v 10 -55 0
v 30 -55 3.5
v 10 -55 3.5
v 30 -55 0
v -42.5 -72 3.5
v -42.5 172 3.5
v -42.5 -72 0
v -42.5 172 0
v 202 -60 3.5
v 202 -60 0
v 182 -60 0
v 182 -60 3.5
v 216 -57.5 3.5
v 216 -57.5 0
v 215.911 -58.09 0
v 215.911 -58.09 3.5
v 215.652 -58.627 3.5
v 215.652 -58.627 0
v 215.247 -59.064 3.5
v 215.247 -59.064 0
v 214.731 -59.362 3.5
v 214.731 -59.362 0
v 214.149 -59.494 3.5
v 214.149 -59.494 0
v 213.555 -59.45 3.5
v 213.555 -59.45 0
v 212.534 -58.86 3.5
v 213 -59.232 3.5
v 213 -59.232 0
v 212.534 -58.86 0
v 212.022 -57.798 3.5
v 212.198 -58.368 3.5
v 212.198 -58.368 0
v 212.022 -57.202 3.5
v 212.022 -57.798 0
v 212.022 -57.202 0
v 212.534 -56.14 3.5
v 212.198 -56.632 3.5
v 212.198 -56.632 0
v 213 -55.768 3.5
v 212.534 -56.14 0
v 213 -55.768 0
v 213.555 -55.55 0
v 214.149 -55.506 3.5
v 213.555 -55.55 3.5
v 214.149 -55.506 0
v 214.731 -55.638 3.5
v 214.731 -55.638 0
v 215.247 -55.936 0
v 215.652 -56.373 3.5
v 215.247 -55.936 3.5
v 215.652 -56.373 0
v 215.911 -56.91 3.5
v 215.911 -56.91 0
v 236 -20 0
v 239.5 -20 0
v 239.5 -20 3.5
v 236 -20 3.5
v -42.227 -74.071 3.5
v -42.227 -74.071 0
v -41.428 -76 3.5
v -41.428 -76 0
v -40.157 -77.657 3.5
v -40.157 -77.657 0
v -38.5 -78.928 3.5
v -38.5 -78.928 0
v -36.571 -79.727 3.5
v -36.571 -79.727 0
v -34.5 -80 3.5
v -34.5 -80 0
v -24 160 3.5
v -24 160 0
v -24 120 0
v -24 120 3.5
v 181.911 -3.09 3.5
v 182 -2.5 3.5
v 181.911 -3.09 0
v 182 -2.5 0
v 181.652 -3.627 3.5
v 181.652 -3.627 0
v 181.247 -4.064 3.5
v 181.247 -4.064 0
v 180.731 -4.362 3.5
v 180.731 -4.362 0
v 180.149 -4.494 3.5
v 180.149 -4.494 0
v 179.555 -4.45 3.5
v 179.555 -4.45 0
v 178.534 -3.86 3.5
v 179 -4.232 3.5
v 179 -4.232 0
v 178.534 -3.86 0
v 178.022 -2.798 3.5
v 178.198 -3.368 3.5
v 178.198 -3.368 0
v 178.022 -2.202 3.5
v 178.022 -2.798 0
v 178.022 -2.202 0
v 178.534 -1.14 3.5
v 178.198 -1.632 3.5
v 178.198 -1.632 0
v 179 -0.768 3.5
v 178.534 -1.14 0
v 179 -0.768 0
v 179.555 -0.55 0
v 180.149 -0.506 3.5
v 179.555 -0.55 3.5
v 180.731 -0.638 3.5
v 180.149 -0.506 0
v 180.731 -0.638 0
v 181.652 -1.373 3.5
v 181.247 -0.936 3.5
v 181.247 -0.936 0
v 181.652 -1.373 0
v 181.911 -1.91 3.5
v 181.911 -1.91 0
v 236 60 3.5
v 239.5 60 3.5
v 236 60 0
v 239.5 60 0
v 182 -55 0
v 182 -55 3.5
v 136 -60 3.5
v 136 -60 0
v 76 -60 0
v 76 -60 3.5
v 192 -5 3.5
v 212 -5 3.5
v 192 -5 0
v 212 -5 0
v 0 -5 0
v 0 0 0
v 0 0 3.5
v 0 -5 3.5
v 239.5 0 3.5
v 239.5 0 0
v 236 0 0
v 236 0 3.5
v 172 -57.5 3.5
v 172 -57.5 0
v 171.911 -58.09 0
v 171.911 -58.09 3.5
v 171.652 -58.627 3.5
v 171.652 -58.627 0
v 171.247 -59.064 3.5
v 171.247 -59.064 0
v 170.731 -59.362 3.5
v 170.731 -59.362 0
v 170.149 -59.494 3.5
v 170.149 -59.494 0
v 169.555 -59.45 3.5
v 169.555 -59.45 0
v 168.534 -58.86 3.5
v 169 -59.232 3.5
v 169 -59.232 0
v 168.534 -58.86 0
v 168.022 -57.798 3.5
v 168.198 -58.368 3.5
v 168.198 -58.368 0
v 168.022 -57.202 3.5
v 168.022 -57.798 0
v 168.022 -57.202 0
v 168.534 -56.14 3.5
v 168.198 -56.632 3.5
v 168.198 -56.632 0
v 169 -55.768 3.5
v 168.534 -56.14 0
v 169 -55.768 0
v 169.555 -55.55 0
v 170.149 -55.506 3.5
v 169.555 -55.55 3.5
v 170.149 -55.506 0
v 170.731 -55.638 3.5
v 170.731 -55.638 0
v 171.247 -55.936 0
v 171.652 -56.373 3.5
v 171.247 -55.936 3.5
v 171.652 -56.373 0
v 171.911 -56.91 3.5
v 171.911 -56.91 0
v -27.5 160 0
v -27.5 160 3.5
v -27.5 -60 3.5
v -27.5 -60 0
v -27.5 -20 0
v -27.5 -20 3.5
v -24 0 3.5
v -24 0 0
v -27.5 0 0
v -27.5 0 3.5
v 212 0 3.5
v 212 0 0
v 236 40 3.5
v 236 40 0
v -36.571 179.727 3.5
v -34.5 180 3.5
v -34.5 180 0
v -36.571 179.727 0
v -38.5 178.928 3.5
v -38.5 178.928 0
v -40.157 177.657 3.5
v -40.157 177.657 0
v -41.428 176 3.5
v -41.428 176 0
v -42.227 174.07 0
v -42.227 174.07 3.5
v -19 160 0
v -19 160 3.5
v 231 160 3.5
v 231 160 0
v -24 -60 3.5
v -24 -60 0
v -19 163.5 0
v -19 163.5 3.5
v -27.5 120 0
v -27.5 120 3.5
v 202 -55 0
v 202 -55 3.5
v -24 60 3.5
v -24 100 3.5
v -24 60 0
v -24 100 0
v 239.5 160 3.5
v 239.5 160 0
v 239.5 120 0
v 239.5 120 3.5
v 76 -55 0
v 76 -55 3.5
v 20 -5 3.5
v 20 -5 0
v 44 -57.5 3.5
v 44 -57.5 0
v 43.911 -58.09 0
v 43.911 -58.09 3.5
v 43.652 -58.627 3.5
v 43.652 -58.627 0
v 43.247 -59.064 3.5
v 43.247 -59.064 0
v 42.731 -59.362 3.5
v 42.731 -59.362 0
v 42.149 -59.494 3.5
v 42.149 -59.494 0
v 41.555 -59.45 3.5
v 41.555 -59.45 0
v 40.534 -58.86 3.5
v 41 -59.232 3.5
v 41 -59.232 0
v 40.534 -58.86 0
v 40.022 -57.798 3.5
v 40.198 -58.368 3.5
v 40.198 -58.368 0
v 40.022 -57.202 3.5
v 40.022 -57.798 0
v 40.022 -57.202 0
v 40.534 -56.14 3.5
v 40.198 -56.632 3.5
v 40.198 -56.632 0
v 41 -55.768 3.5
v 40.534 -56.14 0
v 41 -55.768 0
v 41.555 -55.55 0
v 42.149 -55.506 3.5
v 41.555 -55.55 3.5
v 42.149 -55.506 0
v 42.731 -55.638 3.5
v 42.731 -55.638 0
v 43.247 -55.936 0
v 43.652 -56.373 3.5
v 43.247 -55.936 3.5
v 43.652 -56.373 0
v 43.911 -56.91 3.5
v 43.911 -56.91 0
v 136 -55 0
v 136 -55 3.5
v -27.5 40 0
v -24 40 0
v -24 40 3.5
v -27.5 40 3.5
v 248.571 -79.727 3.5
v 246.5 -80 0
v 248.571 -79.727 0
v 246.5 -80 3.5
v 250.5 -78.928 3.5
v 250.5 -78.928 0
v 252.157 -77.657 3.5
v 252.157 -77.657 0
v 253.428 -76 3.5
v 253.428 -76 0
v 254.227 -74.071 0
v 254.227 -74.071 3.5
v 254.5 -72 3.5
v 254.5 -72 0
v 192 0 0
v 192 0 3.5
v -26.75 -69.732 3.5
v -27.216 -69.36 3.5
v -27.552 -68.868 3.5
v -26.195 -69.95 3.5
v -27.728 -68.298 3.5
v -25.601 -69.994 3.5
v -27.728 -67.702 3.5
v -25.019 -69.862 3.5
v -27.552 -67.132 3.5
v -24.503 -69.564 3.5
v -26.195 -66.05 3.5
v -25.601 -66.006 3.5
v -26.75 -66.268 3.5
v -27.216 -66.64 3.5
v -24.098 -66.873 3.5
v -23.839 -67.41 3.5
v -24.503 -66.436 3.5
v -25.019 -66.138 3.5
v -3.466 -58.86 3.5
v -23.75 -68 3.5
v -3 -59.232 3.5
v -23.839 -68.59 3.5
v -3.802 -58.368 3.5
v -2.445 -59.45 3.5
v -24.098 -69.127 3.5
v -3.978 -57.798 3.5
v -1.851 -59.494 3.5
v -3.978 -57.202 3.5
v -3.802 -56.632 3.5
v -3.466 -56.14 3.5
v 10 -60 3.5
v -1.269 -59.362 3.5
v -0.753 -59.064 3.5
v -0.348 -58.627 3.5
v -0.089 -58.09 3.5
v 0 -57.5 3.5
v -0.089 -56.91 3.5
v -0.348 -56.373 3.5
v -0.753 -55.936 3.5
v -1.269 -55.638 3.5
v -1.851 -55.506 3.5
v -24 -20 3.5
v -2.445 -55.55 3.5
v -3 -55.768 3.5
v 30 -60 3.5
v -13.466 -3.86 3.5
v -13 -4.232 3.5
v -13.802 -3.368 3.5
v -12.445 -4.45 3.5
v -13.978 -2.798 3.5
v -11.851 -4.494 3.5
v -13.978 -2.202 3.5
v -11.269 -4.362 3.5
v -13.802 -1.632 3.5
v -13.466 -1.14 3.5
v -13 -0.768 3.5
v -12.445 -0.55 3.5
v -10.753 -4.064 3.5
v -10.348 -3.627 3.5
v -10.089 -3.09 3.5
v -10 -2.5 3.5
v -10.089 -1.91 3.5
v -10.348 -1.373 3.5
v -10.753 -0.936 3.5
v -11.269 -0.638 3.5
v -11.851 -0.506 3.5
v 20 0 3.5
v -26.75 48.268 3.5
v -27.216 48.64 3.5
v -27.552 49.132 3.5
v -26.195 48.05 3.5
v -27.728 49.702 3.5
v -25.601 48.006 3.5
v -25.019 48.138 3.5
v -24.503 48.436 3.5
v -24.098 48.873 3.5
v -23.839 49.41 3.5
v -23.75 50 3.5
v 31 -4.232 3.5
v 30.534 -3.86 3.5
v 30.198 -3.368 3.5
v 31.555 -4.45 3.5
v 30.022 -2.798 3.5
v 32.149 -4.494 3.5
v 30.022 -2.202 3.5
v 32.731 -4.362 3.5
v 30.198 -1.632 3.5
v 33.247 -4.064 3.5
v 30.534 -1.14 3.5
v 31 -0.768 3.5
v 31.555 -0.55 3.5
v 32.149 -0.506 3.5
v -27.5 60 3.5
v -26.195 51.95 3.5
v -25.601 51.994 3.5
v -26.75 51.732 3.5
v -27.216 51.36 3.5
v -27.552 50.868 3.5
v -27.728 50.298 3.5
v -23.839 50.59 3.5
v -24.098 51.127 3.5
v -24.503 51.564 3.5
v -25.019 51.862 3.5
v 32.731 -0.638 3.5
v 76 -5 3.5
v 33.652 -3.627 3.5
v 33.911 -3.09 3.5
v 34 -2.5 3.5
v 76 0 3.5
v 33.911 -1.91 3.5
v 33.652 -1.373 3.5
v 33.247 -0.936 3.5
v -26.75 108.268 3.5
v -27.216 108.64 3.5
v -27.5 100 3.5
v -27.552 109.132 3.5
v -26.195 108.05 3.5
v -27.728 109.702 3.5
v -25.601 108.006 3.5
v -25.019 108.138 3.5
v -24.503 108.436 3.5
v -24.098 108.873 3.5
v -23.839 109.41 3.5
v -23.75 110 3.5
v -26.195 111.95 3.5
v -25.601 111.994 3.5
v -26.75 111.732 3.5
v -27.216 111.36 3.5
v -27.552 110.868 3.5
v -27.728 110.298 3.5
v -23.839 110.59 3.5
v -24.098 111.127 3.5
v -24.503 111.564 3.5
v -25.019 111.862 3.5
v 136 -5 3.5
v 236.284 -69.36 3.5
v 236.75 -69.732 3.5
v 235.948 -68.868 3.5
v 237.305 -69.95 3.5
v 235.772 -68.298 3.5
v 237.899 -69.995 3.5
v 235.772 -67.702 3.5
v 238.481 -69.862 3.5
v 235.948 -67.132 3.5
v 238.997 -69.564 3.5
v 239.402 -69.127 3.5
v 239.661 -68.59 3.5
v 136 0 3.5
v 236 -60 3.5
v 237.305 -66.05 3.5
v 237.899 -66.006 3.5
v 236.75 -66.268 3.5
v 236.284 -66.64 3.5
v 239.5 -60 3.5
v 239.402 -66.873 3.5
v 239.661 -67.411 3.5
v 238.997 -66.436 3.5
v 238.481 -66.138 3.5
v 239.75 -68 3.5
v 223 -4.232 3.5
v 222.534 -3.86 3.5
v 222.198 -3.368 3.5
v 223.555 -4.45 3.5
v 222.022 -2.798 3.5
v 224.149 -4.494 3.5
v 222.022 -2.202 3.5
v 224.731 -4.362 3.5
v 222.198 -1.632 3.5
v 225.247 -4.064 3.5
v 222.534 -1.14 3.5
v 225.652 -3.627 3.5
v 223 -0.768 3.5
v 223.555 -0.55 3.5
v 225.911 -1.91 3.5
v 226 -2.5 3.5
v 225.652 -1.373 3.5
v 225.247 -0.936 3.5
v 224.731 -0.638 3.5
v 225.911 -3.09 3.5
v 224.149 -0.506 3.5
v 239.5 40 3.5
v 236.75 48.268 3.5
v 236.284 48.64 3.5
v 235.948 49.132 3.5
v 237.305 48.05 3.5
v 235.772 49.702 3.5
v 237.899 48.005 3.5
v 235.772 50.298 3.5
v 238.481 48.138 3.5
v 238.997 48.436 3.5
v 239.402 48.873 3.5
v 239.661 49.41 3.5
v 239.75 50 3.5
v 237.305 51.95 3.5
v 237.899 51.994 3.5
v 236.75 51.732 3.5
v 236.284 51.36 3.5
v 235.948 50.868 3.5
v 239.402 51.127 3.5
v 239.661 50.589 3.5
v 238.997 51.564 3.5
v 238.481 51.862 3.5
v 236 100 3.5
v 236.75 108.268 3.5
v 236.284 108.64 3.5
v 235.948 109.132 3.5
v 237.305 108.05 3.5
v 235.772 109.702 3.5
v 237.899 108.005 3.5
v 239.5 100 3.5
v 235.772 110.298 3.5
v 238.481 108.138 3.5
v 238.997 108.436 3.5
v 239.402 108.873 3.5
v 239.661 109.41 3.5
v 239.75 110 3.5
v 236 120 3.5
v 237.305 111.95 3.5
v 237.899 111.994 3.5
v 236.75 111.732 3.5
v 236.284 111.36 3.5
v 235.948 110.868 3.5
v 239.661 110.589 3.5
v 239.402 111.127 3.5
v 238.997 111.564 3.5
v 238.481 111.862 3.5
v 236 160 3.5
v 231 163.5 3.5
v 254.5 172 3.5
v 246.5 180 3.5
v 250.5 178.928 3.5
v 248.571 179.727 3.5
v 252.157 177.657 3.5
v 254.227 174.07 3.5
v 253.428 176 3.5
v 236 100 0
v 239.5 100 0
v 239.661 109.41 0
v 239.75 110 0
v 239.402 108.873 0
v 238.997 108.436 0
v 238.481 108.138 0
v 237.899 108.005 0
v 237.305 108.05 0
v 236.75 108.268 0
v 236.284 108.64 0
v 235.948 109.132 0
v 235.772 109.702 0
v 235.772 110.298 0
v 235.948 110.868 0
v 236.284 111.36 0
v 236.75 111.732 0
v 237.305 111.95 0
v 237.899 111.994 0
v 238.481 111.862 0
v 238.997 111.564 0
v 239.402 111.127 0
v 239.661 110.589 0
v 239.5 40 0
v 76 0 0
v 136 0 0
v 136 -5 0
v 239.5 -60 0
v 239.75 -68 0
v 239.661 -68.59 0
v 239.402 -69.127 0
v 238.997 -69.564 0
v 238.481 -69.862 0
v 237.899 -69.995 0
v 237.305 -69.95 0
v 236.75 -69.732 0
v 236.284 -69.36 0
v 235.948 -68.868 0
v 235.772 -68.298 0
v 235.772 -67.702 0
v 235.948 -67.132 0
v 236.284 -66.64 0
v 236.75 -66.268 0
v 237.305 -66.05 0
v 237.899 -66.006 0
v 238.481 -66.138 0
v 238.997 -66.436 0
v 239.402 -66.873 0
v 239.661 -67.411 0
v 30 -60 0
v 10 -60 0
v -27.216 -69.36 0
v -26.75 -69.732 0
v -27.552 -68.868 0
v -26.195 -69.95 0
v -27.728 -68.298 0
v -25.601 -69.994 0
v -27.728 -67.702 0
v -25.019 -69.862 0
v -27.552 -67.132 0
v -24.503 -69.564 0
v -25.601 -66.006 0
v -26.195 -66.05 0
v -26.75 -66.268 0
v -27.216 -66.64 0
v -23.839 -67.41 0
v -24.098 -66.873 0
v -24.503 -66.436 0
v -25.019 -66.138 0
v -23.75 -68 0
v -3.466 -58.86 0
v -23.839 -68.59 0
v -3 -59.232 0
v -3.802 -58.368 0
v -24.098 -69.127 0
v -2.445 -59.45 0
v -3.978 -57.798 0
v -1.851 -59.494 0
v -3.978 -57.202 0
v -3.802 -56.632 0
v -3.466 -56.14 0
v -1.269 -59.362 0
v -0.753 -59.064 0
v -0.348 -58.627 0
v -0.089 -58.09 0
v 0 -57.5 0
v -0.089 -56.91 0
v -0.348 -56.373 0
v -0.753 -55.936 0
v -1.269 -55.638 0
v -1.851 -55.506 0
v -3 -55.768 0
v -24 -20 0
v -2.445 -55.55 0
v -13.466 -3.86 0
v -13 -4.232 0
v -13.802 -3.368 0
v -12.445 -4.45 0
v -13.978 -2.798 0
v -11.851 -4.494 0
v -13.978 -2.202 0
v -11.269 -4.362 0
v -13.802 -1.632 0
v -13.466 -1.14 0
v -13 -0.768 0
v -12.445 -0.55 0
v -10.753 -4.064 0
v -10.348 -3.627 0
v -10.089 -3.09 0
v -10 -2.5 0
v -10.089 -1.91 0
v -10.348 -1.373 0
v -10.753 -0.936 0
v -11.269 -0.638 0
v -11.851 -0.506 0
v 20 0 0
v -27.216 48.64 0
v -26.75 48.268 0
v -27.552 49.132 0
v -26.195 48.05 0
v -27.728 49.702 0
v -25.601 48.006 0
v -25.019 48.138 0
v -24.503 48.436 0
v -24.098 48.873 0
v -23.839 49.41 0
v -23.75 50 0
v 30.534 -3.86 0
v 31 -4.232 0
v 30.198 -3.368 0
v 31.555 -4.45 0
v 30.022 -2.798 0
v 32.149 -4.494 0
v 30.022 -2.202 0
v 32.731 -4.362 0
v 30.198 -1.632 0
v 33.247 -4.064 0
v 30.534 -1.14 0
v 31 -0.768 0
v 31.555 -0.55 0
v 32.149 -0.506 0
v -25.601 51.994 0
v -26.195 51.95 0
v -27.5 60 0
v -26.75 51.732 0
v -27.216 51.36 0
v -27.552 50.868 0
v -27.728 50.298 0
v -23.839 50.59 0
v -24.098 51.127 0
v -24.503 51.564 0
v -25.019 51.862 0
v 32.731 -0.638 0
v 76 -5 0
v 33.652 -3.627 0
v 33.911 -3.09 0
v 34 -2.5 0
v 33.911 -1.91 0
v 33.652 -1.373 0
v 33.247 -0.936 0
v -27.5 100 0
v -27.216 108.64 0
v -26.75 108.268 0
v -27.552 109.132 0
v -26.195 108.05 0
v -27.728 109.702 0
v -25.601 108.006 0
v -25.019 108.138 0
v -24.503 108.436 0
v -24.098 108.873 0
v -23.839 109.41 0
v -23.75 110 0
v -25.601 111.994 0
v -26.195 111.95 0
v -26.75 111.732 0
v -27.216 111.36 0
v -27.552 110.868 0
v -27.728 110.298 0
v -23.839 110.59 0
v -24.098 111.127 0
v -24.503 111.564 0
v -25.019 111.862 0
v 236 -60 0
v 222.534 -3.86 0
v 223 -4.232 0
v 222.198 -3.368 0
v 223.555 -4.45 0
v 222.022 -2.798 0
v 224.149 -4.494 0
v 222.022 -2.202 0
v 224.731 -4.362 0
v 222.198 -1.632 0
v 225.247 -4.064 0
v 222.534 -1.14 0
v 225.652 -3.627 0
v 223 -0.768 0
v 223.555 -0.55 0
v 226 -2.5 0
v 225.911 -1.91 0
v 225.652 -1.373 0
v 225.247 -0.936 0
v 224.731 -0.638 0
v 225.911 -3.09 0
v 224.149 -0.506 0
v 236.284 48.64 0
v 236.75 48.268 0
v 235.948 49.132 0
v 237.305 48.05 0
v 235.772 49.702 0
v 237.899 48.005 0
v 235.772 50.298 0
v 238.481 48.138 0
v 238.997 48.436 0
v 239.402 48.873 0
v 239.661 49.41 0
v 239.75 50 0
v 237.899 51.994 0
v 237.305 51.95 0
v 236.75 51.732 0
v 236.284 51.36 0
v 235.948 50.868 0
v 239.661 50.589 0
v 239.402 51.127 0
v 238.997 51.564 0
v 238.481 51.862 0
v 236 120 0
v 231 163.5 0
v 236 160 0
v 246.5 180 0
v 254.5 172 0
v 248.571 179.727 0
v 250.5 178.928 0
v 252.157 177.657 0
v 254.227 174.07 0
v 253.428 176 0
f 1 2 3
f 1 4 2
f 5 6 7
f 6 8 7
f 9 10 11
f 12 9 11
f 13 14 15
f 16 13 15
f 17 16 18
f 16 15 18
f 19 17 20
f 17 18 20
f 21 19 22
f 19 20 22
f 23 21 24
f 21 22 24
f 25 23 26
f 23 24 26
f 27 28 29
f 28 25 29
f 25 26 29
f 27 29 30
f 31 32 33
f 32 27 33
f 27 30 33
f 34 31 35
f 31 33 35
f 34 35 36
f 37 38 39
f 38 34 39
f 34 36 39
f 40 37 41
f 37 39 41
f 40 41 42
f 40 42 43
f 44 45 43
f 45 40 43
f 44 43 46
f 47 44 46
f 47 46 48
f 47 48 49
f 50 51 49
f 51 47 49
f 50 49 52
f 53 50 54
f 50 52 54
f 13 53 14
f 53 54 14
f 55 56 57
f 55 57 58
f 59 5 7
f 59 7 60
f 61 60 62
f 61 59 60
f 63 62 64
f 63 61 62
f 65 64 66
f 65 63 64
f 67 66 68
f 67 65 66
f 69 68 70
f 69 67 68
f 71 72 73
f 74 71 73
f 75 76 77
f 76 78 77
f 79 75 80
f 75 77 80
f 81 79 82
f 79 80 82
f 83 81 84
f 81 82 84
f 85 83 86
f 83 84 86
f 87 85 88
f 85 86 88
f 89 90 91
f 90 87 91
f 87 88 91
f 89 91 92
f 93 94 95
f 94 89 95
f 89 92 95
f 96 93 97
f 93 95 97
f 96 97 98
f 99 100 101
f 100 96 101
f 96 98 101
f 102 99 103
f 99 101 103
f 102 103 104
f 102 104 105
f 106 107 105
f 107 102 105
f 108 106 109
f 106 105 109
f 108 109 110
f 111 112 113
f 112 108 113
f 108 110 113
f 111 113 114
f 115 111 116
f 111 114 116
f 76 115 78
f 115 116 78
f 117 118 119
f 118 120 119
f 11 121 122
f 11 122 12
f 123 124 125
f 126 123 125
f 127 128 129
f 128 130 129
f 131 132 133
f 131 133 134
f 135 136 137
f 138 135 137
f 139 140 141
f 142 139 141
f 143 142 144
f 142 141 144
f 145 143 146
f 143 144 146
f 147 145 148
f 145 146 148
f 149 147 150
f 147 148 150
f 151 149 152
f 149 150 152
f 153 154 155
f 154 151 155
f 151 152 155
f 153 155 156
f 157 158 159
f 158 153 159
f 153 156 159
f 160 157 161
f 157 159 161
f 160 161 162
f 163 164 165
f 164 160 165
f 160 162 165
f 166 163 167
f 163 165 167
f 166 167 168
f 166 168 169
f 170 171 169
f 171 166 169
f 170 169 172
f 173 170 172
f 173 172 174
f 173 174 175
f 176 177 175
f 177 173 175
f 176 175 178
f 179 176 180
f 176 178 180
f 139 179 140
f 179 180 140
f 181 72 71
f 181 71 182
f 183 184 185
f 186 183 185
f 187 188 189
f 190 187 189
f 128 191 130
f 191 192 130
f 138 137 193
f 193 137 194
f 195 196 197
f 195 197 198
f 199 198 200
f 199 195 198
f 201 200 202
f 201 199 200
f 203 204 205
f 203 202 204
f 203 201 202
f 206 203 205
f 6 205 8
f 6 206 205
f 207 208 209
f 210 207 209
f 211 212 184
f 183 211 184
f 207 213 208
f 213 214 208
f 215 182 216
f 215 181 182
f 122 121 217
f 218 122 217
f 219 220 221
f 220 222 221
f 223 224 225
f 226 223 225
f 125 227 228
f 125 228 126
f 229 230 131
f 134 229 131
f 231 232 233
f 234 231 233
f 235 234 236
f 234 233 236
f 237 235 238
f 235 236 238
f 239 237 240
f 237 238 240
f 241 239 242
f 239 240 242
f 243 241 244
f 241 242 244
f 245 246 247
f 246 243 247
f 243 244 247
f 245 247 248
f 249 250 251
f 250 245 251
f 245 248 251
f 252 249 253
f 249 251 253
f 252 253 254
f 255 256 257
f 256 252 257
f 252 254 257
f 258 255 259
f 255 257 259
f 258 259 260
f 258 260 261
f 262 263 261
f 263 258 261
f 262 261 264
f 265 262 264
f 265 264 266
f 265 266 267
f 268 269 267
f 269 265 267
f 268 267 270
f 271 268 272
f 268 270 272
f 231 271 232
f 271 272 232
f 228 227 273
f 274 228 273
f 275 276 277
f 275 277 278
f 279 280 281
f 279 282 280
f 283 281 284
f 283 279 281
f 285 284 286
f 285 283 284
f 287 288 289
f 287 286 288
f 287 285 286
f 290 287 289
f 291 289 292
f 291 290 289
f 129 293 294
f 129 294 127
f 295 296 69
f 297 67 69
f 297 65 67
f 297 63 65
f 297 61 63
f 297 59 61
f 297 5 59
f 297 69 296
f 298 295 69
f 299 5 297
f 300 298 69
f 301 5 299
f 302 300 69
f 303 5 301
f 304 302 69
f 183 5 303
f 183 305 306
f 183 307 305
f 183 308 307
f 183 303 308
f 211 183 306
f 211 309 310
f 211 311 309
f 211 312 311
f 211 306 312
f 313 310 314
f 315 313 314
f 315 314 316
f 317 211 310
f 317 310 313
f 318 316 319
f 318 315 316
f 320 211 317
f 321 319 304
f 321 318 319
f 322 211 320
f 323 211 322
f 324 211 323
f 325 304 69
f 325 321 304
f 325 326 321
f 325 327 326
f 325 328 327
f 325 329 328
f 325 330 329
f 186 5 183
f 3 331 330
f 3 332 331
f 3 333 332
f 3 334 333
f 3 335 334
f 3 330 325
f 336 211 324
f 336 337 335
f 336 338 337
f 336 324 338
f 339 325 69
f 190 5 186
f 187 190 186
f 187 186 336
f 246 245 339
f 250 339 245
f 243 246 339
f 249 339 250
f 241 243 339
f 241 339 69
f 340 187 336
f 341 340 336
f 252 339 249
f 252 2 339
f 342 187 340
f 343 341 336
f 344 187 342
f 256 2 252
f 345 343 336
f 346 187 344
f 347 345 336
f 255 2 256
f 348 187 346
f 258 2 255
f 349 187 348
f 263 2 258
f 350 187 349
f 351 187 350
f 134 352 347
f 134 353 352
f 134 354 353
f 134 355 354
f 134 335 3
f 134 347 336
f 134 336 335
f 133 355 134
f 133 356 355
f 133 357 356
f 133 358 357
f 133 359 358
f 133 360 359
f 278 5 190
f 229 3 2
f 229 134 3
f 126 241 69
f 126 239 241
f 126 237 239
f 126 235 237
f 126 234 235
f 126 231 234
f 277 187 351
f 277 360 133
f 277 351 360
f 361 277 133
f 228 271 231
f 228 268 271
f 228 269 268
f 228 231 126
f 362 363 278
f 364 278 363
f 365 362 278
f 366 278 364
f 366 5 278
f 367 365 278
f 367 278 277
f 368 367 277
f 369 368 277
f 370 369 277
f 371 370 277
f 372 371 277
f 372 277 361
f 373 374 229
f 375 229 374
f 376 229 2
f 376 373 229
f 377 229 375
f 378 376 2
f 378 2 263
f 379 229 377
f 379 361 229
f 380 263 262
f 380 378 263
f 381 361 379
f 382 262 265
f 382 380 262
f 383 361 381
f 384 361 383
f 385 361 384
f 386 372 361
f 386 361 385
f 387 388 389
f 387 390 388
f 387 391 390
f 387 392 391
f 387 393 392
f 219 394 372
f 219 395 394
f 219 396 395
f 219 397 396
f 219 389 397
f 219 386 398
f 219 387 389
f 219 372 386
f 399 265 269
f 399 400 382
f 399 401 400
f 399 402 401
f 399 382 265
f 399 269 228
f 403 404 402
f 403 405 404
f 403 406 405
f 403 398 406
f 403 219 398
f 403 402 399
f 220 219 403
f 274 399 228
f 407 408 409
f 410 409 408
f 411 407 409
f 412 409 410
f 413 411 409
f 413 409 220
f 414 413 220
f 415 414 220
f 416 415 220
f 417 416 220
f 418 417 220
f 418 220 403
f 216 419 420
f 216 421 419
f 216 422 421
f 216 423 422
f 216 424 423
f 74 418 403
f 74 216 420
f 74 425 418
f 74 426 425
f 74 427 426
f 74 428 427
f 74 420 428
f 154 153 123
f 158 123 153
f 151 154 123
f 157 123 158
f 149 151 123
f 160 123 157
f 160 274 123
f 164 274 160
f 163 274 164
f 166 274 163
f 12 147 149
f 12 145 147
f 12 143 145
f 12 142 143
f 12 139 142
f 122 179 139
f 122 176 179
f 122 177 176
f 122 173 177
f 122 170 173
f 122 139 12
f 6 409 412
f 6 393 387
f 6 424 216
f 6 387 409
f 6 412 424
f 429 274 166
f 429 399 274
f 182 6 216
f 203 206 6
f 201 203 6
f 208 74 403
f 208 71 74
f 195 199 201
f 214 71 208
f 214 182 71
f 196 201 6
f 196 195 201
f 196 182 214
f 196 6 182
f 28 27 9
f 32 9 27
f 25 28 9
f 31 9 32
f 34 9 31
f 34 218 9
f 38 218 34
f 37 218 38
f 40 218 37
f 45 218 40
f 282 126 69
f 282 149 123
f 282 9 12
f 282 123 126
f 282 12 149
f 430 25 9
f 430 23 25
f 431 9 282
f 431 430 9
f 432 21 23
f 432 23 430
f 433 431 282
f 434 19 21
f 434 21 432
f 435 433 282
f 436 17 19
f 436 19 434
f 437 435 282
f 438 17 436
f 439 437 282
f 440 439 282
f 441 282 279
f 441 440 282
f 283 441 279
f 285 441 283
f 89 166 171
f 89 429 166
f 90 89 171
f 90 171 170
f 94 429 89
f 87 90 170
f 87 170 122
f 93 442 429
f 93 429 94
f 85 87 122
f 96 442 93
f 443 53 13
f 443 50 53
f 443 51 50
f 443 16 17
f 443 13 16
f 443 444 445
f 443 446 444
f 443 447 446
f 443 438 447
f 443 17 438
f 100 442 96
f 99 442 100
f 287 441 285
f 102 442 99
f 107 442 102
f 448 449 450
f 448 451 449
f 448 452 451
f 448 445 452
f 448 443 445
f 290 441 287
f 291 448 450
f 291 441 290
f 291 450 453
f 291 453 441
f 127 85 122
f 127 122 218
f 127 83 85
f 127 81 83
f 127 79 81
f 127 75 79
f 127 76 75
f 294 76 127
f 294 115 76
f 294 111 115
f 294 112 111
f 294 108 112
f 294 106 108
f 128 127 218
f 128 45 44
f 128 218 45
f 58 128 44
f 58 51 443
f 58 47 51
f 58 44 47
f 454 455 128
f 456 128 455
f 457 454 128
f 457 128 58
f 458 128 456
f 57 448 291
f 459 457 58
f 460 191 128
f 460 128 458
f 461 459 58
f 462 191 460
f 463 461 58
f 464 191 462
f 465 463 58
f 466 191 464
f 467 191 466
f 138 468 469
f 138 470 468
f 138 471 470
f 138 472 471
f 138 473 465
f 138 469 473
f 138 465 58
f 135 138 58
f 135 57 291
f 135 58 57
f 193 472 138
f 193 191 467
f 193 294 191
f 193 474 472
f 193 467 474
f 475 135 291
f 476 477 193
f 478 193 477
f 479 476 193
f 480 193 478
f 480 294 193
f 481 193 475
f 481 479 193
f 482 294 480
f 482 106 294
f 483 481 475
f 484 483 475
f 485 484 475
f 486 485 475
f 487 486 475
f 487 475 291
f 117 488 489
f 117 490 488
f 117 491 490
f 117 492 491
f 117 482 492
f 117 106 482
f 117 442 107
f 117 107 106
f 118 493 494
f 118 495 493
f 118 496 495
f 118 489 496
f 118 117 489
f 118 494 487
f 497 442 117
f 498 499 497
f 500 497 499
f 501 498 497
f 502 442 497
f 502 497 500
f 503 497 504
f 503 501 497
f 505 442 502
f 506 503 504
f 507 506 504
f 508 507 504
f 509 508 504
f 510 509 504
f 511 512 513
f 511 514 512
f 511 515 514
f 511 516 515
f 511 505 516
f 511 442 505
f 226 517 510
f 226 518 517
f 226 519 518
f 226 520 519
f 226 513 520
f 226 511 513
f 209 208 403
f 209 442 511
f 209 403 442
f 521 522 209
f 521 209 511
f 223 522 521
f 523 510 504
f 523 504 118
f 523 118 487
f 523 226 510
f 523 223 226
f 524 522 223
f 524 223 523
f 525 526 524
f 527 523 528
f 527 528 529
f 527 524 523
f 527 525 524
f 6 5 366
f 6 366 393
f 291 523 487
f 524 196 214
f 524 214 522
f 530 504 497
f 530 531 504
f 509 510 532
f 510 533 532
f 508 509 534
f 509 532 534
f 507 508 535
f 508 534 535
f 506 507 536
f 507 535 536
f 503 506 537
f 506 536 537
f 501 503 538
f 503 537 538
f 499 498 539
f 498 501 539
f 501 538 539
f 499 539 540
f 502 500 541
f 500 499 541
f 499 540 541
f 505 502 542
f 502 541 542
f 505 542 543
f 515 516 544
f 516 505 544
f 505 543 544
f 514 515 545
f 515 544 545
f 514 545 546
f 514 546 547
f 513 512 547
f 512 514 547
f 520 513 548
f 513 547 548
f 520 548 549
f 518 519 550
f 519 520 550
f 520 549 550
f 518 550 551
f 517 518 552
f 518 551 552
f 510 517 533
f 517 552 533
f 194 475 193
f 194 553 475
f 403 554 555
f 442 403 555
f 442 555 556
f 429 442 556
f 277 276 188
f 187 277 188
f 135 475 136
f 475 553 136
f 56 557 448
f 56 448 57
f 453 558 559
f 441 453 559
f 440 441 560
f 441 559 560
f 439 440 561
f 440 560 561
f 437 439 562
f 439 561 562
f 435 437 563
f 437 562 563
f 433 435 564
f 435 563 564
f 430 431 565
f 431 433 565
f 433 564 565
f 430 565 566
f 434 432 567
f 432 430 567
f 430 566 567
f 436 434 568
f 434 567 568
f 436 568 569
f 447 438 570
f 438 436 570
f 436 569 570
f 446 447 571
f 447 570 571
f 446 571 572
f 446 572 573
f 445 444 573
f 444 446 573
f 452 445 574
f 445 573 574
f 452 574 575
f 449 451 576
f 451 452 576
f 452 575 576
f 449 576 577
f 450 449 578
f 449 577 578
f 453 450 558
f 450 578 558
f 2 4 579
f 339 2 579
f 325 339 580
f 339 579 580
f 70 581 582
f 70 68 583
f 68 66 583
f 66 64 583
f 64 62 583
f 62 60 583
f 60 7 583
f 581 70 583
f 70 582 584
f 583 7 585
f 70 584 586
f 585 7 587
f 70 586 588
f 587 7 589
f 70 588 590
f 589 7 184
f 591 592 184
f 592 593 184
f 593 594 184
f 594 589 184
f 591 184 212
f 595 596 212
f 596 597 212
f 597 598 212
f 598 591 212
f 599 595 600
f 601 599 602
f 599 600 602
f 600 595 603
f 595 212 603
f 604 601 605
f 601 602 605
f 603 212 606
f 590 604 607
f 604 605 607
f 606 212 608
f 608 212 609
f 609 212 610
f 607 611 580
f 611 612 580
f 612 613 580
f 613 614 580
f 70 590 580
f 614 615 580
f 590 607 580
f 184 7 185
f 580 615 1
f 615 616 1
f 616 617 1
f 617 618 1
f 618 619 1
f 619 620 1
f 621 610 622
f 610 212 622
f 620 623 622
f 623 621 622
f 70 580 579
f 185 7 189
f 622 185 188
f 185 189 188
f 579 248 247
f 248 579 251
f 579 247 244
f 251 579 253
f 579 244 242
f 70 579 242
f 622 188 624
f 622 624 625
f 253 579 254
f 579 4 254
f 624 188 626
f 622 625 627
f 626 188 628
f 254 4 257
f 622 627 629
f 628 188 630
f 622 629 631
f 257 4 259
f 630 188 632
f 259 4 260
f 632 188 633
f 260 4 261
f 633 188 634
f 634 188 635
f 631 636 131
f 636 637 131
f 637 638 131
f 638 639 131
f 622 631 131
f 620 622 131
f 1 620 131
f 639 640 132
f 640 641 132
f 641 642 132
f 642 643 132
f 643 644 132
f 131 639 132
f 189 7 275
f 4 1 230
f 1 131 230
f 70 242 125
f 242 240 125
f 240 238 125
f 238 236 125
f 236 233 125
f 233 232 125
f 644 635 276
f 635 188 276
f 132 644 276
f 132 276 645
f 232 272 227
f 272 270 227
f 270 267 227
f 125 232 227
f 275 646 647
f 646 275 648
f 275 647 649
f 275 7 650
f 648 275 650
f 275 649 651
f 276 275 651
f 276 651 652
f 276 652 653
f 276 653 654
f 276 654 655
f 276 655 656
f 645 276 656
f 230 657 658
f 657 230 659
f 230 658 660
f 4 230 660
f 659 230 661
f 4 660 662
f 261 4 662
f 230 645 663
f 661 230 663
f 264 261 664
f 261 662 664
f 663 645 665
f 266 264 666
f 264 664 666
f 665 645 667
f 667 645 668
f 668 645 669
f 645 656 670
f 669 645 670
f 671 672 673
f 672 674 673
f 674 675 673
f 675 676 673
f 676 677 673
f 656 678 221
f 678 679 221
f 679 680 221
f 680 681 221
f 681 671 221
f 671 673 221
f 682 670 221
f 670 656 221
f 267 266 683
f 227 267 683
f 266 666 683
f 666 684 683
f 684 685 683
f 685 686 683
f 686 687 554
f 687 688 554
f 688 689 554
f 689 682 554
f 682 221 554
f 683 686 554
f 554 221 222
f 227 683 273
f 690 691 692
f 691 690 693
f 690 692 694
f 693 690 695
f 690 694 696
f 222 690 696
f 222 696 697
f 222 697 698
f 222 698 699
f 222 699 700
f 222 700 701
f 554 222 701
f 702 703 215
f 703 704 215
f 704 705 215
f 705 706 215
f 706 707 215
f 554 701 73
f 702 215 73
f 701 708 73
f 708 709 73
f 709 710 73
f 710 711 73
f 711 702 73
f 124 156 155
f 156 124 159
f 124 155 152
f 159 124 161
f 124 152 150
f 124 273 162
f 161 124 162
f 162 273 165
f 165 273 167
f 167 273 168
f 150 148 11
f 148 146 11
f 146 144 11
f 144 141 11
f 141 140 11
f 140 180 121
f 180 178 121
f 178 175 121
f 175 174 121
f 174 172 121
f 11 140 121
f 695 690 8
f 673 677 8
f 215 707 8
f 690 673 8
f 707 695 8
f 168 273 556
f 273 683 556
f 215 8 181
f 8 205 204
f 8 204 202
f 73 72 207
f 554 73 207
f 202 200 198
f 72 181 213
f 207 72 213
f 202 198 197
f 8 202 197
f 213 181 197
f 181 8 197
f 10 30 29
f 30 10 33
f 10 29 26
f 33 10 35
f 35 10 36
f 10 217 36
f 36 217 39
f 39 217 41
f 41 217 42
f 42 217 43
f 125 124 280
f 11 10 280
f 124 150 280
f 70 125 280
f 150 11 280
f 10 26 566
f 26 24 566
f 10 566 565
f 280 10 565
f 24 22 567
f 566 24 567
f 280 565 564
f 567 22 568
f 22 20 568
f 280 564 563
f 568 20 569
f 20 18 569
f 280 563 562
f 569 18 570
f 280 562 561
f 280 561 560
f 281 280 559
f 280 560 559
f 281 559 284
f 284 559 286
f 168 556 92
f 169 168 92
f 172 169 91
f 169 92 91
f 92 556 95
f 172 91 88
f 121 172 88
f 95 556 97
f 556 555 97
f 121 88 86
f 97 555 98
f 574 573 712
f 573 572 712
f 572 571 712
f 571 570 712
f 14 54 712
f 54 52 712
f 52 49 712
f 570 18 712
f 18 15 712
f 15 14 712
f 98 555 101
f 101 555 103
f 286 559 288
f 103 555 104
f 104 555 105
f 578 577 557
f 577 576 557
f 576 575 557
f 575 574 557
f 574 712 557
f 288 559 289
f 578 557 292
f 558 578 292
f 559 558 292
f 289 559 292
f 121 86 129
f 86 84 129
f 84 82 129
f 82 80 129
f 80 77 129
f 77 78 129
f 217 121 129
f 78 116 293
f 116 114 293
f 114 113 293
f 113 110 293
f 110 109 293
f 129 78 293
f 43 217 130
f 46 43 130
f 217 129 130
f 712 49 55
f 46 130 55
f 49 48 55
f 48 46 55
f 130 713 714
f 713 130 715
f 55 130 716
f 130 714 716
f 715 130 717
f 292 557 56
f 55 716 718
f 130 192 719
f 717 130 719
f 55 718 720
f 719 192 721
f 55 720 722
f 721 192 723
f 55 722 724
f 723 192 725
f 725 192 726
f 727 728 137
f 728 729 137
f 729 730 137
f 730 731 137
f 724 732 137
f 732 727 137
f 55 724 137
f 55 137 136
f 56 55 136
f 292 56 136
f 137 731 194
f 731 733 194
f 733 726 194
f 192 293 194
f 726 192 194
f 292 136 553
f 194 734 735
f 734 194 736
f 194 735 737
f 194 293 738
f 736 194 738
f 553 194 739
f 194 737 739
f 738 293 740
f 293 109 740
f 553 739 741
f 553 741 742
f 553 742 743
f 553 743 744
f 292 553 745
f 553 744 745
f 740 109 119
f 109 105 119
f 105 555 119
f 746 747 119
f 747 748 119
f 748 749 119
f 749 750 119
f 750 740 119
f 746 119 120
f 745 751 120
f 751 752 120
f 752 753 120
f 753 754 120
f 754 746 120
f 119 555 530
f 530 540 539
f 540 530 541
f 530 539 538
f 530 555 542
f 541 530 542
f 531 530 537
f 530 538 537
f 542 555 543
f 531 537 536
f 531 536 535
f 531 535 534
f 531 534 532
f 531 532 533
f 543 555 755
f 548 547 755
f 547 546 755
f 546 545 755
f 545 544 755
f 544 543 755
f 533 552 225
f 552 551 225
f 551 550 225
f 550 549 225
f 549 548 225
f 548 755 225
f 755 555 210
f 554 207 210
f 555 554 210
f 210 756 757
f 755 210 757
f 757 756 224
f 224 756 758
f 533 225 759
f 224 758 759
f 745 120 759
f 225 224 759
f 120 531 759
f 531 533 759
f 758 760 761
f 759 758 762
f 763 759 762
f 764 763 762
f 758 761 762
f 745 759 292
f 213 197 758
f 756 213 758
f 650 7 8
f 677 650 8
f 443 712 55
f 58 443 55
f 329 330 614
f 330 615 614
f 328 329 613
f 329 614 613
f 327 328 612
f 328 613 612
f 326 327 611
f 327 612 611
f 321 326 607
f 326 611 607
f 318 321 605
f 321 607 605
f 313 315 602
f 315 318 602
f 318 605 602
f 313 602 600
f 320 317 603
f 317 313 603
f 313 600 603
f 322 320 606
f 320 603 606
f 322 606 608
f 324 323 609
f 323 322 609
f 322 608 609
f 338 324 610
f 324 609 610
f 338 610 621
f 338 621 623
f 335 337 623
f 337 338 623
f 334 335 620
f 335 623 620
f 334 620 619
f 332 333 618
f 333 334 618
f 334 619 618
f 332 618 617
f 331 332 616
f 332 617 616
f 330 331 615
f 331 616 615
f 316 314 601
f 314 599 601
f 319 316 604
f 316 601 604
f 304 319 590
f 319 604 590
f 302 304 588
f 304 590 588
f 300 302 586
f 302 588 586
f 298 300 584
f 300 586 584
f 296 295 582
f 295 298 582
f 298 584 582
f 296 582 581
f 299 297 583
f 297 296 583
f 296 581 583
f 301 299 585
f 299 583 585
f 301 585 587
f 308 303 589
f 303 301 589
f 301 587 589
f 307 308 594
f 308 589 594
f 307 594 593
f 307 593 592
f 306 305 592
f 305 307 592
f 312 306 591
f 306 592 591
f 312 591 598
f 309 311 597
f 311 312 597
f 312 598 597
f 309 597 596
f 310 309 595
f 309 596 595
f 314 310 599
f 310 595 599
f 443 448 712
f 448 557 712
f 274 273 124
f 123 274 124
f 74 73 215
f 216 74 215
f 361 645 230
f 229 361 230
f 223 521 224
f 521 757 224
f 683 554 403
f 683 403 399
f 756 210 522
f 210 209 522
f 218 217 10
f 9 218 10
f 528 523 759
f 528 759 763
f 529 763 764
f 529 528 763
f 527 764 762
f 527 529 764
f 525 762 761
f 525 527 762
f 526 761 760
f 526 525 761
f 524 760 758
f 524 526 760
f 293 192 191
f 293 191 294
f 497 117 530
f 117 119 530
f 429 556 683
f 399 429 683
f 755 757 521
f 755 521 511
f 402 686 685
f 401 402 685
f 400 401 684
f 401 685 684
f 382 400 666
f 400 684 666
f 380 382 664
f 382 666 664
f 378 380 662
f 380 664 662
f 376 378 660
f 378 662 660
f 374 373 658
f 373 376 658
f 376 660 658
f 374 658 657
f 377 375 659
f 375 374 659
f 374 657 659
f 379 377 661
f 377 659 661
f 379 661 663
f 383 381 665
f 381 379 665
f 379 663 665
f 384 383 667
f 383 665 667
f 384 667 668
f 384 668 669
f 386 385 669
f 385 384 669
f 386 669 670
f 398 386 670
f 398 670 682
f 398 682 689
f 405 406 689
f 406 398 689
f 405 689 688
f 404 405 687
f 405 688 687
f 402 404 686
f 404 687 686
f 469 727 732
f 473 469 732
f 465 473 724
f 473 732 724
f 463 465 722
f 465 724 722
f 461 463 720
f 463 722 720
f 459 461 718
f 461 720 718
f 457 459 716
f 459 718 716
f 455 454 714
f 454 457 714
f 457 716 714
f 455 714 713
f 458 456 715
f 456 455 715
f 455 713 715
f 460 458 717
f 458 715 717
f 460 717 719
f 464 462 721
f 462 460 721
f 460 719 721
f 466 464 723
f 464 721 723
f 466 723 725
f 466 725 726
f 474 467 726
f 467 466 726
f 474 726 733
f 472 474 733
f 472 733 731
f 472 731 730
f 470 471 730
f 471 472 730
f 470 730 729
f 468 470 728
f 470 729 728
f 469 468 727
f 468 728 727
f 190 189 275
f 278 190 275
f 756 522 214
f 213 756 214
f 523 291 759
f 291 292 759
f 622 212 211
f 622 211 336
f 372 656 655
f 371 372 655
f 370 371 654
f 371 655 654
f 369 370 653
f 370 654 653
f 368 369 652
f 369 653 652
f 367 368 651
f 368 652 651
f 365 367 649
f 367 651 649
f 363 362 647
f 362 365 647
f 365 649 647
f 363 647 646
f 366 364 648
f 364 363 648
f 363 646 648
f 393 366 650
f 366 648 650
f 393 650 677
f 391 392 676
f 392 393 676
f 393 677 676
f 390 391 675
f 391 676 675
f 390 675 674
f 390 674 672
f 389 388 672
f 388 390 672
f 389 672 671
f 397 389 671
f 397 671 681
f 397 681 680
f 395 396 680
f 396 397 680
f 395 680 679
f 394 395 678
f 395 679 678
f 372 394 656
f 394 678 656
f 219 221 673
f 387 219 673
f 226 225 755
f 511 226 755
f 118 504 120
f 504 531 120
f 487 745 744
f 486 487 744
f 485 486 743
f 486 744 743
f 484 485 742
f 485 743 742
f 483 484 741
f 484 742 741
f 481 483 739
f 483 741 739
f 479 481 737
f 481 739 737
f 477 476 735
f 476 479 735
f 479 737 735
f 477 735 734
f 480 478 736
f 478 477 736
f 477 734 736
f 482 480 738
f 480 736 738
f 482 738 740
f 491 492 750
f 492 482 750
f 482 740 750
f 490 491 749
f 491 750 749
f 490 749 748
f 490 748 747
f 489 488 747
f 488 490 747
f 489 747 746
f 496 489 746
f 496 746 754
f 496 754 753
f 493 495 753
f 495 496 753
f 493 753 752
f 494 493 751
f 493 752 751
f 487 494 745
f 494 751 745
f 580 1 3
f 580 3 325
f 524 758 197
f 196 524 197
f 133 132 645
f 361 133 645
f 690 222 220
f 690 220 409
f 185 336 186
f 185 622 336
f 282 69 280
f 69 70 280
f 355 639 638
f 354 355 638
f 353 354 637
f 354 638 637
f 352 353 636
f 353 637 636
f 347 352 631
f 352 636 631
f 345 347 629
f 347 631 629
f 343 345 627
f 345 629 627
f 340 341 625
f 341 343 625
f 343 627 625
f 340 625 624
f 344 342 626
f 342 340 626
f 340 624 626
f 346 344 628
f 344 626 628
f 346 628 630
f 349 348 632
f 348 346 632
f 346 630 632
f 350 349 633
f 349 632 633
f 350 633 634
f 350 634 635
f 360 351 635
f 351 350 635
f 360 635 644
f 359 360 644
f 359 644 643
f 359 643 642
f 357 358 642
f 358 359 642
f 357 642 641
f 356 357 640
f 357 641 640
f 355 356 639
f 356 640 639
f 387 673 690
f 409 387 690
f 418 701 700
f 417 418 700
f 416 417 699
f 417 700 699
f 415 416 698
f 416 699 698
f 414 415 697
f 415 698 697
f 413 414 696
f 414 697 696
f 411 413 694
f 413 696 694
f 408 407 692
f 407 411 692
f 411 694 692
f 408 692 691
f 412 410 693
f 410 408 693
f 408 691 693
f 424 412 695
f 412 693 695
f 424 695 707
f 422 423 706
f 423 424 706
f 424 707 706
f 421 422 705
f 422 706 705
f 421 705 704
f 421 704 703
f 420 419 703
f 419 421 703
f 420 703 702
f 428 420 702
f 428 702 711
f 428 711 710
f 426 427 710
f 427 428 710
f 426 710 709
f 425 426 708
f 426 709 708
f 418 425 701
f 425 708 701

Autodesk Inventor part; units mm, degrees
ref_plane "YZ Plane" through (0, 0, 0) normal (1, 0, 0) x (0, 1, 0)
ref_plane "XZ Plane" through (0, 0, 0) normal (0, 1, 0) x (-1, 0, 0)
ref_plane "XY Plane" through (0, 0, 0) normal (0, 0, 1) x (1, 0, 0)
sketch "Sketch1" plane through (0, 0, 0) normal (0, 0, 1) x (1, 0, 0)
  line L0 (0, 0) -> (20, 0)
  line L1 (0, 0) -> (0, -5)
  line L2 (20, -5) -> (0, -5)
  line L3 (20, 0) -> (20, -5)
  line L4 (76, 0) -> (76, -5)
  line L5 (76, 0) -> (136, 0)
  line L6 (136, -5) -> (76, -5)
  line L7 (136, 0) -> (136, -5)
  line L8 (192, 0) -> (192, -5)
  line L9 (212, 0) -> (192, 0)
  line L10 (212, -5) -> (192, -5)
  line L11 (212, 0) -> (212, -5)
  line L12 (10, -55) -> (10, -60)
  line L13 (30, -55) -> (10, -55)
  line L14 (30, -60) -> (10, -60)
  line L15 (30, -55) -> (30, -60)
  line L16 (76, -55) -> (76, -60)
  line L17 (76, -55) -> (136, -55)
  line L18 (136, -60) -> (76, -60)
  line L19 (136, -55) -> (136, -60)
  line L20 (182, -55) -> (182, -60)
  line L21 (182, -55) -> (202, -55)
  line L22 (202, -60) -> (182, -60)
  line L23 (202, -55) -> (202, -60)
  line L24 (236, -70.0001) -> (236, -80.0001) construction
  line L25 (239.5, -70.0001) -> (236, -70.0001) construction
  line L26 (239.5, -70.0001) -> (239.5, -80.0001) construction
  line L27 (236, -80.0001) -> (239.5, -80.0001) construction
  line L28 (-27.5, -80) -> (-27.5, -70) construction
  line L29 (-24, -70) -> (-27.5, -70) construction
  line L30 (-24, -70) -> (-24, -80) construction
  line L31 (-24, -80) -> (-27.5, -80) construction
  line L32 (-27.5, -60) -> (-27.5, -20)
  line L33 (-24, -20) -> (-27.5, -20)
  line L34 (-24, -60) -> (-24, -20)
  line L35 (-24, -60) -> (-27.5, -60)
  line L36 (-27.5, 0) -> (-27.5, 40)
  line L37 (-24, 40) -> (-24, 0)
  line L38 (-24, 40) -> (-27.5, 40)
  line L39 (-24, 0) -> (-27.5, 0)
  line L40 (-27.5, 60) -> (-27.5, 100)
  line L41 (-24, 100) -> (-27.5, 100)
  line L42 (-24, 100) -> (-24, 60)
  line L43 (-24, 60) -> (-27.5, 60)
  line L44 (-27.5, 160) -> (-27.5, 120)
  line L45 (-24, 160) -> (-24, 120)
  line L46 (-24, 160) -> (-27.5, 160)
  line L47 (236, -0.0001) -> (236, 39.9999)
  line L48 (239.5, 39.9999) -> (239.5, -0.0001)
  line L49 (239.5, 39.9999) -> (236, 39.9999)
  line L50 (239.5, -0.0001) -> (236, -0.0001)
  line L51 (236, -60.0001) -> (236, -20.0001)
  line L52 (239.5, -60.0001) -> (239.5, -20.0001)
  line L53 (239.5, -20.0001) -> (236, -20.0001)
  line L54 (239.5, -60.0001) -> (236, -60.0001)
  line L55 (239.5, 99.9999) -> (236, 99.9999)
  line L56 (236, 59.9999) -> (236, 99.9999)
  line L57 (239.5, 99.9999) -> (239.5, 59.9999)
  line L58 (239.5, 59.9999) -> (236, 59.9999)
  line L59 (236, 159.9999) -> (236, 119.9999)
  line L60 (239.5, 159.9999) -> (239.5, 119.9999)
  line L61 (236, 159.9999) -> (239.5, 159.9999)
  line L62 (236, 111.9999) -> (239.5, 111.9999) construction
  line L63 (239.5, 107.9999) -> (236, 107.9999) construction
  line L64 (236, 51.9999) -> (239.5, 51.9999) construction
  line L65 (239.5, 47.9999) -> (236, 47.9999) construction
  line L66 (236, -66.0001) -> (239.5, -66.0001) construction
  line L67 (212, -60) -> (212, -55) construction
  line L68 (216, -55) -> (216, -60) construction
  line L69 (168, -60) -> (168, -55) construction
  line L70 (172, -55) -> (172, -60) construction
  line L71 (40, -60) -> (40, -55) construction
  line L72 (44, -55) -> (44, -60) construction
  line L73 (-4, -60) -> (-4, -55) construction
  line L74 (0, -55) -> (0, -60) construction
  line L75 (-14, -5) -> (-14, 0) construction
  line L76 (-10, 0) -> (-10, -5) construction
  line L77 (30, -5) -> (30, 0) construction
  line L78 (34, 0) -> (34, -5) construction
  line L79 (178, -5) -> (178, 0) construction
  line L80 (182, 0) -> (182, -5) construction
  line L81 (222, -5) -> (222, 0) construction
  line L82 (226, 0) -> (226, -5) construction
  line L83 (-27.5, -66) -> (-24, -66) construction
  line L84 (-27.5, 52) -> (-24, 52) construction
  line L85 (-24, 48) -> (-27.5, 48) construction
  line L86 (-24, 108) -> (-27.5, 108) construction
  line L87 (-27.5, 112) -> (-24, 112) construction
  line L88 (-24, 120) -> (-27.5, 120)
  line L89 (239.5, 119.9999) -> (236, 119.9999)
  line L90 (-25.75, 112) -> (-25.75, 108) construction
  circle A0 centre (-25.75, 110) radius 2
  line L91 (-25.75, 52) -> (-25.75, 48) construction
  circle A1 centre (-25.75, 50) radius 2
  line L92 (-25.75, -66) -> (-25.75, -70) construction
  circle A2 centre (-25.75, -68) radius 2
  line L93 (237.75, 111.9999) -> (237.75, 107.9999) construction
  circle A3 centre (237.75, 109.9999) radius 2
  line L94 (237.75, 51.9999) -> (237.75, 47.9999) construction
  circle A4 centre (237.75, 49.9999) radius 2
  line L95 (237.75, -66.0001) -> (237.75, -70.0001) construction
  circle A5 centre (237.75, -68.0001) radius 2
  line L96 (-14, -2.5) -> (-10, -2.5) construction
  line L97 (30, -2.5) -> (34, -2.5) construction
  line L98 (178, -2.5) -> (182, -2.5) construction
  line L99 (222, -2.5) -> (226, -2.5) construction
  line L100 (212, -57.5) -> (216, -57.5) construction
  line L101 (168, -57.5) -> (172, -57.5) construction
  line L102 (40, -57.5) -> (44, -57.5) construction
  line L103 (-4, -57.5) -> (0, -57.5) construction
  circle A6 centre (-12, -2.5) radius 2
  circle A7 centre (32, -2.5) radius 2
  circle A8 centre (180, -2.5) radius 2
  circle A9 centre (224, -2.5) radius 2
  circle A10 centre (214, -57.5) radius 2
  circle A11 centre (170, -57.5) radius 2
  circle A12 centre (42, -57.5) radius 2
  circle A13 centre (-2, -57.5) radius 2
  line L104 (-27.5, -80) -> (-42.5, -80) construction
  line L105 (239.5, 159.9999) -> (254.5, 159.9999) construction
  line L106 (254.5, 159.9999) -> (254.5, 179.9999) construction
  line L107 (254.5, 179.9999) -> (239.5, 179.9999) construction
  line L108 (239.5, 179.9999) -> (239.5, 159.9999) construction
  line L109 (254.5, 179.9999) -> (-42.5, 179.9999)
  line L110 (-42.5, 179.9999) -> (-42.5, -80)
  line L111 (-42.5, -80) -> (254.5, -80)
  line L112 (254.5, -80) -> (254.5, 179.9999)
  dimension "d0" = 15
  dimension "d3" = 15
  dimension "d4" = 20
extrude "Extrusion1" add sketch "Sketch1" along normal blind 3.5
fillet "Fillet1" radius 8 4 edges at (254.5, 179.9999, 1.75) (-42.5, 179.9999, 1.75) (254.5, -80, 1.75) (-42.5, -80, 1.75)
sketch "Sketch2" plane through (0, 0, 3.5) normal (0, 0, 1) x (1, 0, 0)
  arc A0 (-42.5, -72) -> (-34.5, -80) centre (-34.5, -72) ccw construction
  line L0 (-34.5, -80) -> (246.5, -80) construction
  arc A1 (246.5, -80) -> (254.5, -72) centre (246.5, -72) ccw construction
  line L1 (254.5, -72) -> (254.5, 171.9999) construction
  arc A2 (254.5, 171.9999) -> (246.5, 179.9999) centre (246.5, 171.9999) ccw construction
  line L2 (246.5, 179.9999) -> (-34.5, 179.9999) construction
  arc A3 (-34.5, 179.9999) -> (-42.5, 171.9999) centre (-34.5, 171.9999) ccw construction
  line L3 (-42.5, 171.9999) -> (-42.5, -72) construction
  line L4 (76, -55) -> (136, -55) construction
  line L5 (136, -55) -> (136, -60) construction
  line L6 (136, -60) -> (76, -60) construction
  line L7 (76, -60) -> (76, -55) construction
  line L8 (76, 0) -> (136, 0) construction
  line L9 (136, 0) -> (136, -5) construction
  line L10 (136, -5) -> (76, -5) construction
  line L11 (76, -5) -> (76, 0) construction
  line L12 (236, 159.9999) -> (239.5, 159.9999) construction
  line L13 (239.5, 159.9999) -> (239.5, 119.9999) construction
  line L14 (239.5, 119.9999) -> (236, 119.9999) construction
  line L15 (236, 119.9999) -> (236, 159.9999) construction
  line L16 (239.5, 99.9999) -> (239.5, 59.9999) construction
  line L17 (239.5, 59.9999) -> (236, 59.9999) construction
  line L18 (236, 59.9999) -> (236, 99.9999) construction
  line L19 (236, 99.9999) -> (239.5, 99.9999) construction
  line L20 (236, -20.0001) -> (239.5, -20.0001) construction
  line L21 (239.5, -20.0001) -> (239.5, -60.0001) construction
  line L22 (239.5, -60.0001) -> (236, -60.0001) construction
  line L23 (236, -60.0001) -> (236, -20.0001) construction
  line L24 (236, 39.9999) -> (239.5, 39.9999) construction
  line L25 (239.5, 39.9999) -> (239.5, -0.0001) construction
  line L26 (239.5, -0.0001) -> (236, -0.0001) construction
  line L27 (236, -0.0001) -> (236, 39.9999) construction
  line L28 (-27.5, 160) -> (-24, 160) construction
  line L29 (-24, 160) -> (-24, 120) construction
  line L30 (-24, 120) -> (-27.5, 120) construction
  line L31 (-27.5, 120) -> (-27.5, 160) construction
  line L32 (-27.5, 100) -> (-24, 100) construction
  line L33 (-24, 100) -> (-24, 60) construction
  line L34 (-24, 60) -> (-27.5, 60) construction
  line L35 (-27.5, 60) -> (-27.5, 100) construction
  line L36 (-27.5, 40) -> (-24, 40) construction
  line L37 (-24, 40) -> (-24, 0) construction
  line L38 (-24, 0) -> (-27.5, 0) construction
  line L39 (-27.5, 0) -> (-27.5, 40) construction
  line L40 (-27.5, -20) -> (-24, -20) construction
  line L41 (-24, -20) -> (-24, -60) construction
  line L42 (-24, -60) -> (-27.5, -60) construction
  line L43 (-27.5, -60) -> (-27.5, -20) construction
  line L44 (182, -55) -> (202, -55) construction
  line L45 (202, -55) -> (202, -60) construction
  line L46 (202, -60) -> (182, -60) construction
  line L47 (182, -60) -> (182, -55) construction
  line L48 (10, -55) -> (30, -55) construction
  line L49 (30, -55) -> (30, -60) construction
  line L50 (30, -60) -> (10, -60) construction
  line L51 (10, -60) -> (10, -55) construction
  line L52 (192, 0) -> (212, 0) construction
  line L53 (212, 0) -> (212, -5) construction
  line L54 (212, -5) -> (192, -5) construction
  line L55 (192, -5) -> (192, 0) construction
  line L56 (20, 0) -> (20, -5) construction
  line L57 (20, -5) -> (0, -5) construction
  line L58 (0, -5) -> (0, 0) construction
  line L59 (0, 0) -> (20, 0) construction
  circle A4 centre (-2, -57.5) radius 2 construction
  circle A5 centre (42, -57.5) radius 2 construction
  circle A6 centre (170, -57.5) radius 2 construction
  circle A7 centre (214, -57.5) radius 2 construction
  circle A8 centre (224, -2.5) radius 2 construction
  circle A9 centre (180, -2.5) radius 2 construction
  circle A10 centre (32, -2.5) radius 2 construction
  circle A11 centre (-12, -2.5) radius 2 construction
  circle A12 centre (237.75, -68.0001) radius 2 construction
  circle A13 centre (237.75, 49.9999) radius 2 construction
  circle A14 centre (237.75, 109.9999) radius 2 construction
  circle A15 centre (-25.75, -68) radius 2 construction
  circle A16 centre (-25.75, 50) radius 2 construction
  circle A17 centre (-25.75, 110) radius 2 construction
  line L60 (-24, 160) -> (236, 159.9999) construction
  line L61 (-19, 160) -> (231, 160)
  line L62 (231, 160) -> (231, 163.5)
  line L63 (231, 163.5) -> (-19, 163.5)
  line L64 (-19, 163.5) -> (-19, 160)
  dimension "d8" = 250
  dimension "d9" = 3.5
  dimension "d10" = 5
extrude "Extrusion2" cut sketch "Sketch2" against normal blind 3.5
properties part number "Tapa_Frontal"
